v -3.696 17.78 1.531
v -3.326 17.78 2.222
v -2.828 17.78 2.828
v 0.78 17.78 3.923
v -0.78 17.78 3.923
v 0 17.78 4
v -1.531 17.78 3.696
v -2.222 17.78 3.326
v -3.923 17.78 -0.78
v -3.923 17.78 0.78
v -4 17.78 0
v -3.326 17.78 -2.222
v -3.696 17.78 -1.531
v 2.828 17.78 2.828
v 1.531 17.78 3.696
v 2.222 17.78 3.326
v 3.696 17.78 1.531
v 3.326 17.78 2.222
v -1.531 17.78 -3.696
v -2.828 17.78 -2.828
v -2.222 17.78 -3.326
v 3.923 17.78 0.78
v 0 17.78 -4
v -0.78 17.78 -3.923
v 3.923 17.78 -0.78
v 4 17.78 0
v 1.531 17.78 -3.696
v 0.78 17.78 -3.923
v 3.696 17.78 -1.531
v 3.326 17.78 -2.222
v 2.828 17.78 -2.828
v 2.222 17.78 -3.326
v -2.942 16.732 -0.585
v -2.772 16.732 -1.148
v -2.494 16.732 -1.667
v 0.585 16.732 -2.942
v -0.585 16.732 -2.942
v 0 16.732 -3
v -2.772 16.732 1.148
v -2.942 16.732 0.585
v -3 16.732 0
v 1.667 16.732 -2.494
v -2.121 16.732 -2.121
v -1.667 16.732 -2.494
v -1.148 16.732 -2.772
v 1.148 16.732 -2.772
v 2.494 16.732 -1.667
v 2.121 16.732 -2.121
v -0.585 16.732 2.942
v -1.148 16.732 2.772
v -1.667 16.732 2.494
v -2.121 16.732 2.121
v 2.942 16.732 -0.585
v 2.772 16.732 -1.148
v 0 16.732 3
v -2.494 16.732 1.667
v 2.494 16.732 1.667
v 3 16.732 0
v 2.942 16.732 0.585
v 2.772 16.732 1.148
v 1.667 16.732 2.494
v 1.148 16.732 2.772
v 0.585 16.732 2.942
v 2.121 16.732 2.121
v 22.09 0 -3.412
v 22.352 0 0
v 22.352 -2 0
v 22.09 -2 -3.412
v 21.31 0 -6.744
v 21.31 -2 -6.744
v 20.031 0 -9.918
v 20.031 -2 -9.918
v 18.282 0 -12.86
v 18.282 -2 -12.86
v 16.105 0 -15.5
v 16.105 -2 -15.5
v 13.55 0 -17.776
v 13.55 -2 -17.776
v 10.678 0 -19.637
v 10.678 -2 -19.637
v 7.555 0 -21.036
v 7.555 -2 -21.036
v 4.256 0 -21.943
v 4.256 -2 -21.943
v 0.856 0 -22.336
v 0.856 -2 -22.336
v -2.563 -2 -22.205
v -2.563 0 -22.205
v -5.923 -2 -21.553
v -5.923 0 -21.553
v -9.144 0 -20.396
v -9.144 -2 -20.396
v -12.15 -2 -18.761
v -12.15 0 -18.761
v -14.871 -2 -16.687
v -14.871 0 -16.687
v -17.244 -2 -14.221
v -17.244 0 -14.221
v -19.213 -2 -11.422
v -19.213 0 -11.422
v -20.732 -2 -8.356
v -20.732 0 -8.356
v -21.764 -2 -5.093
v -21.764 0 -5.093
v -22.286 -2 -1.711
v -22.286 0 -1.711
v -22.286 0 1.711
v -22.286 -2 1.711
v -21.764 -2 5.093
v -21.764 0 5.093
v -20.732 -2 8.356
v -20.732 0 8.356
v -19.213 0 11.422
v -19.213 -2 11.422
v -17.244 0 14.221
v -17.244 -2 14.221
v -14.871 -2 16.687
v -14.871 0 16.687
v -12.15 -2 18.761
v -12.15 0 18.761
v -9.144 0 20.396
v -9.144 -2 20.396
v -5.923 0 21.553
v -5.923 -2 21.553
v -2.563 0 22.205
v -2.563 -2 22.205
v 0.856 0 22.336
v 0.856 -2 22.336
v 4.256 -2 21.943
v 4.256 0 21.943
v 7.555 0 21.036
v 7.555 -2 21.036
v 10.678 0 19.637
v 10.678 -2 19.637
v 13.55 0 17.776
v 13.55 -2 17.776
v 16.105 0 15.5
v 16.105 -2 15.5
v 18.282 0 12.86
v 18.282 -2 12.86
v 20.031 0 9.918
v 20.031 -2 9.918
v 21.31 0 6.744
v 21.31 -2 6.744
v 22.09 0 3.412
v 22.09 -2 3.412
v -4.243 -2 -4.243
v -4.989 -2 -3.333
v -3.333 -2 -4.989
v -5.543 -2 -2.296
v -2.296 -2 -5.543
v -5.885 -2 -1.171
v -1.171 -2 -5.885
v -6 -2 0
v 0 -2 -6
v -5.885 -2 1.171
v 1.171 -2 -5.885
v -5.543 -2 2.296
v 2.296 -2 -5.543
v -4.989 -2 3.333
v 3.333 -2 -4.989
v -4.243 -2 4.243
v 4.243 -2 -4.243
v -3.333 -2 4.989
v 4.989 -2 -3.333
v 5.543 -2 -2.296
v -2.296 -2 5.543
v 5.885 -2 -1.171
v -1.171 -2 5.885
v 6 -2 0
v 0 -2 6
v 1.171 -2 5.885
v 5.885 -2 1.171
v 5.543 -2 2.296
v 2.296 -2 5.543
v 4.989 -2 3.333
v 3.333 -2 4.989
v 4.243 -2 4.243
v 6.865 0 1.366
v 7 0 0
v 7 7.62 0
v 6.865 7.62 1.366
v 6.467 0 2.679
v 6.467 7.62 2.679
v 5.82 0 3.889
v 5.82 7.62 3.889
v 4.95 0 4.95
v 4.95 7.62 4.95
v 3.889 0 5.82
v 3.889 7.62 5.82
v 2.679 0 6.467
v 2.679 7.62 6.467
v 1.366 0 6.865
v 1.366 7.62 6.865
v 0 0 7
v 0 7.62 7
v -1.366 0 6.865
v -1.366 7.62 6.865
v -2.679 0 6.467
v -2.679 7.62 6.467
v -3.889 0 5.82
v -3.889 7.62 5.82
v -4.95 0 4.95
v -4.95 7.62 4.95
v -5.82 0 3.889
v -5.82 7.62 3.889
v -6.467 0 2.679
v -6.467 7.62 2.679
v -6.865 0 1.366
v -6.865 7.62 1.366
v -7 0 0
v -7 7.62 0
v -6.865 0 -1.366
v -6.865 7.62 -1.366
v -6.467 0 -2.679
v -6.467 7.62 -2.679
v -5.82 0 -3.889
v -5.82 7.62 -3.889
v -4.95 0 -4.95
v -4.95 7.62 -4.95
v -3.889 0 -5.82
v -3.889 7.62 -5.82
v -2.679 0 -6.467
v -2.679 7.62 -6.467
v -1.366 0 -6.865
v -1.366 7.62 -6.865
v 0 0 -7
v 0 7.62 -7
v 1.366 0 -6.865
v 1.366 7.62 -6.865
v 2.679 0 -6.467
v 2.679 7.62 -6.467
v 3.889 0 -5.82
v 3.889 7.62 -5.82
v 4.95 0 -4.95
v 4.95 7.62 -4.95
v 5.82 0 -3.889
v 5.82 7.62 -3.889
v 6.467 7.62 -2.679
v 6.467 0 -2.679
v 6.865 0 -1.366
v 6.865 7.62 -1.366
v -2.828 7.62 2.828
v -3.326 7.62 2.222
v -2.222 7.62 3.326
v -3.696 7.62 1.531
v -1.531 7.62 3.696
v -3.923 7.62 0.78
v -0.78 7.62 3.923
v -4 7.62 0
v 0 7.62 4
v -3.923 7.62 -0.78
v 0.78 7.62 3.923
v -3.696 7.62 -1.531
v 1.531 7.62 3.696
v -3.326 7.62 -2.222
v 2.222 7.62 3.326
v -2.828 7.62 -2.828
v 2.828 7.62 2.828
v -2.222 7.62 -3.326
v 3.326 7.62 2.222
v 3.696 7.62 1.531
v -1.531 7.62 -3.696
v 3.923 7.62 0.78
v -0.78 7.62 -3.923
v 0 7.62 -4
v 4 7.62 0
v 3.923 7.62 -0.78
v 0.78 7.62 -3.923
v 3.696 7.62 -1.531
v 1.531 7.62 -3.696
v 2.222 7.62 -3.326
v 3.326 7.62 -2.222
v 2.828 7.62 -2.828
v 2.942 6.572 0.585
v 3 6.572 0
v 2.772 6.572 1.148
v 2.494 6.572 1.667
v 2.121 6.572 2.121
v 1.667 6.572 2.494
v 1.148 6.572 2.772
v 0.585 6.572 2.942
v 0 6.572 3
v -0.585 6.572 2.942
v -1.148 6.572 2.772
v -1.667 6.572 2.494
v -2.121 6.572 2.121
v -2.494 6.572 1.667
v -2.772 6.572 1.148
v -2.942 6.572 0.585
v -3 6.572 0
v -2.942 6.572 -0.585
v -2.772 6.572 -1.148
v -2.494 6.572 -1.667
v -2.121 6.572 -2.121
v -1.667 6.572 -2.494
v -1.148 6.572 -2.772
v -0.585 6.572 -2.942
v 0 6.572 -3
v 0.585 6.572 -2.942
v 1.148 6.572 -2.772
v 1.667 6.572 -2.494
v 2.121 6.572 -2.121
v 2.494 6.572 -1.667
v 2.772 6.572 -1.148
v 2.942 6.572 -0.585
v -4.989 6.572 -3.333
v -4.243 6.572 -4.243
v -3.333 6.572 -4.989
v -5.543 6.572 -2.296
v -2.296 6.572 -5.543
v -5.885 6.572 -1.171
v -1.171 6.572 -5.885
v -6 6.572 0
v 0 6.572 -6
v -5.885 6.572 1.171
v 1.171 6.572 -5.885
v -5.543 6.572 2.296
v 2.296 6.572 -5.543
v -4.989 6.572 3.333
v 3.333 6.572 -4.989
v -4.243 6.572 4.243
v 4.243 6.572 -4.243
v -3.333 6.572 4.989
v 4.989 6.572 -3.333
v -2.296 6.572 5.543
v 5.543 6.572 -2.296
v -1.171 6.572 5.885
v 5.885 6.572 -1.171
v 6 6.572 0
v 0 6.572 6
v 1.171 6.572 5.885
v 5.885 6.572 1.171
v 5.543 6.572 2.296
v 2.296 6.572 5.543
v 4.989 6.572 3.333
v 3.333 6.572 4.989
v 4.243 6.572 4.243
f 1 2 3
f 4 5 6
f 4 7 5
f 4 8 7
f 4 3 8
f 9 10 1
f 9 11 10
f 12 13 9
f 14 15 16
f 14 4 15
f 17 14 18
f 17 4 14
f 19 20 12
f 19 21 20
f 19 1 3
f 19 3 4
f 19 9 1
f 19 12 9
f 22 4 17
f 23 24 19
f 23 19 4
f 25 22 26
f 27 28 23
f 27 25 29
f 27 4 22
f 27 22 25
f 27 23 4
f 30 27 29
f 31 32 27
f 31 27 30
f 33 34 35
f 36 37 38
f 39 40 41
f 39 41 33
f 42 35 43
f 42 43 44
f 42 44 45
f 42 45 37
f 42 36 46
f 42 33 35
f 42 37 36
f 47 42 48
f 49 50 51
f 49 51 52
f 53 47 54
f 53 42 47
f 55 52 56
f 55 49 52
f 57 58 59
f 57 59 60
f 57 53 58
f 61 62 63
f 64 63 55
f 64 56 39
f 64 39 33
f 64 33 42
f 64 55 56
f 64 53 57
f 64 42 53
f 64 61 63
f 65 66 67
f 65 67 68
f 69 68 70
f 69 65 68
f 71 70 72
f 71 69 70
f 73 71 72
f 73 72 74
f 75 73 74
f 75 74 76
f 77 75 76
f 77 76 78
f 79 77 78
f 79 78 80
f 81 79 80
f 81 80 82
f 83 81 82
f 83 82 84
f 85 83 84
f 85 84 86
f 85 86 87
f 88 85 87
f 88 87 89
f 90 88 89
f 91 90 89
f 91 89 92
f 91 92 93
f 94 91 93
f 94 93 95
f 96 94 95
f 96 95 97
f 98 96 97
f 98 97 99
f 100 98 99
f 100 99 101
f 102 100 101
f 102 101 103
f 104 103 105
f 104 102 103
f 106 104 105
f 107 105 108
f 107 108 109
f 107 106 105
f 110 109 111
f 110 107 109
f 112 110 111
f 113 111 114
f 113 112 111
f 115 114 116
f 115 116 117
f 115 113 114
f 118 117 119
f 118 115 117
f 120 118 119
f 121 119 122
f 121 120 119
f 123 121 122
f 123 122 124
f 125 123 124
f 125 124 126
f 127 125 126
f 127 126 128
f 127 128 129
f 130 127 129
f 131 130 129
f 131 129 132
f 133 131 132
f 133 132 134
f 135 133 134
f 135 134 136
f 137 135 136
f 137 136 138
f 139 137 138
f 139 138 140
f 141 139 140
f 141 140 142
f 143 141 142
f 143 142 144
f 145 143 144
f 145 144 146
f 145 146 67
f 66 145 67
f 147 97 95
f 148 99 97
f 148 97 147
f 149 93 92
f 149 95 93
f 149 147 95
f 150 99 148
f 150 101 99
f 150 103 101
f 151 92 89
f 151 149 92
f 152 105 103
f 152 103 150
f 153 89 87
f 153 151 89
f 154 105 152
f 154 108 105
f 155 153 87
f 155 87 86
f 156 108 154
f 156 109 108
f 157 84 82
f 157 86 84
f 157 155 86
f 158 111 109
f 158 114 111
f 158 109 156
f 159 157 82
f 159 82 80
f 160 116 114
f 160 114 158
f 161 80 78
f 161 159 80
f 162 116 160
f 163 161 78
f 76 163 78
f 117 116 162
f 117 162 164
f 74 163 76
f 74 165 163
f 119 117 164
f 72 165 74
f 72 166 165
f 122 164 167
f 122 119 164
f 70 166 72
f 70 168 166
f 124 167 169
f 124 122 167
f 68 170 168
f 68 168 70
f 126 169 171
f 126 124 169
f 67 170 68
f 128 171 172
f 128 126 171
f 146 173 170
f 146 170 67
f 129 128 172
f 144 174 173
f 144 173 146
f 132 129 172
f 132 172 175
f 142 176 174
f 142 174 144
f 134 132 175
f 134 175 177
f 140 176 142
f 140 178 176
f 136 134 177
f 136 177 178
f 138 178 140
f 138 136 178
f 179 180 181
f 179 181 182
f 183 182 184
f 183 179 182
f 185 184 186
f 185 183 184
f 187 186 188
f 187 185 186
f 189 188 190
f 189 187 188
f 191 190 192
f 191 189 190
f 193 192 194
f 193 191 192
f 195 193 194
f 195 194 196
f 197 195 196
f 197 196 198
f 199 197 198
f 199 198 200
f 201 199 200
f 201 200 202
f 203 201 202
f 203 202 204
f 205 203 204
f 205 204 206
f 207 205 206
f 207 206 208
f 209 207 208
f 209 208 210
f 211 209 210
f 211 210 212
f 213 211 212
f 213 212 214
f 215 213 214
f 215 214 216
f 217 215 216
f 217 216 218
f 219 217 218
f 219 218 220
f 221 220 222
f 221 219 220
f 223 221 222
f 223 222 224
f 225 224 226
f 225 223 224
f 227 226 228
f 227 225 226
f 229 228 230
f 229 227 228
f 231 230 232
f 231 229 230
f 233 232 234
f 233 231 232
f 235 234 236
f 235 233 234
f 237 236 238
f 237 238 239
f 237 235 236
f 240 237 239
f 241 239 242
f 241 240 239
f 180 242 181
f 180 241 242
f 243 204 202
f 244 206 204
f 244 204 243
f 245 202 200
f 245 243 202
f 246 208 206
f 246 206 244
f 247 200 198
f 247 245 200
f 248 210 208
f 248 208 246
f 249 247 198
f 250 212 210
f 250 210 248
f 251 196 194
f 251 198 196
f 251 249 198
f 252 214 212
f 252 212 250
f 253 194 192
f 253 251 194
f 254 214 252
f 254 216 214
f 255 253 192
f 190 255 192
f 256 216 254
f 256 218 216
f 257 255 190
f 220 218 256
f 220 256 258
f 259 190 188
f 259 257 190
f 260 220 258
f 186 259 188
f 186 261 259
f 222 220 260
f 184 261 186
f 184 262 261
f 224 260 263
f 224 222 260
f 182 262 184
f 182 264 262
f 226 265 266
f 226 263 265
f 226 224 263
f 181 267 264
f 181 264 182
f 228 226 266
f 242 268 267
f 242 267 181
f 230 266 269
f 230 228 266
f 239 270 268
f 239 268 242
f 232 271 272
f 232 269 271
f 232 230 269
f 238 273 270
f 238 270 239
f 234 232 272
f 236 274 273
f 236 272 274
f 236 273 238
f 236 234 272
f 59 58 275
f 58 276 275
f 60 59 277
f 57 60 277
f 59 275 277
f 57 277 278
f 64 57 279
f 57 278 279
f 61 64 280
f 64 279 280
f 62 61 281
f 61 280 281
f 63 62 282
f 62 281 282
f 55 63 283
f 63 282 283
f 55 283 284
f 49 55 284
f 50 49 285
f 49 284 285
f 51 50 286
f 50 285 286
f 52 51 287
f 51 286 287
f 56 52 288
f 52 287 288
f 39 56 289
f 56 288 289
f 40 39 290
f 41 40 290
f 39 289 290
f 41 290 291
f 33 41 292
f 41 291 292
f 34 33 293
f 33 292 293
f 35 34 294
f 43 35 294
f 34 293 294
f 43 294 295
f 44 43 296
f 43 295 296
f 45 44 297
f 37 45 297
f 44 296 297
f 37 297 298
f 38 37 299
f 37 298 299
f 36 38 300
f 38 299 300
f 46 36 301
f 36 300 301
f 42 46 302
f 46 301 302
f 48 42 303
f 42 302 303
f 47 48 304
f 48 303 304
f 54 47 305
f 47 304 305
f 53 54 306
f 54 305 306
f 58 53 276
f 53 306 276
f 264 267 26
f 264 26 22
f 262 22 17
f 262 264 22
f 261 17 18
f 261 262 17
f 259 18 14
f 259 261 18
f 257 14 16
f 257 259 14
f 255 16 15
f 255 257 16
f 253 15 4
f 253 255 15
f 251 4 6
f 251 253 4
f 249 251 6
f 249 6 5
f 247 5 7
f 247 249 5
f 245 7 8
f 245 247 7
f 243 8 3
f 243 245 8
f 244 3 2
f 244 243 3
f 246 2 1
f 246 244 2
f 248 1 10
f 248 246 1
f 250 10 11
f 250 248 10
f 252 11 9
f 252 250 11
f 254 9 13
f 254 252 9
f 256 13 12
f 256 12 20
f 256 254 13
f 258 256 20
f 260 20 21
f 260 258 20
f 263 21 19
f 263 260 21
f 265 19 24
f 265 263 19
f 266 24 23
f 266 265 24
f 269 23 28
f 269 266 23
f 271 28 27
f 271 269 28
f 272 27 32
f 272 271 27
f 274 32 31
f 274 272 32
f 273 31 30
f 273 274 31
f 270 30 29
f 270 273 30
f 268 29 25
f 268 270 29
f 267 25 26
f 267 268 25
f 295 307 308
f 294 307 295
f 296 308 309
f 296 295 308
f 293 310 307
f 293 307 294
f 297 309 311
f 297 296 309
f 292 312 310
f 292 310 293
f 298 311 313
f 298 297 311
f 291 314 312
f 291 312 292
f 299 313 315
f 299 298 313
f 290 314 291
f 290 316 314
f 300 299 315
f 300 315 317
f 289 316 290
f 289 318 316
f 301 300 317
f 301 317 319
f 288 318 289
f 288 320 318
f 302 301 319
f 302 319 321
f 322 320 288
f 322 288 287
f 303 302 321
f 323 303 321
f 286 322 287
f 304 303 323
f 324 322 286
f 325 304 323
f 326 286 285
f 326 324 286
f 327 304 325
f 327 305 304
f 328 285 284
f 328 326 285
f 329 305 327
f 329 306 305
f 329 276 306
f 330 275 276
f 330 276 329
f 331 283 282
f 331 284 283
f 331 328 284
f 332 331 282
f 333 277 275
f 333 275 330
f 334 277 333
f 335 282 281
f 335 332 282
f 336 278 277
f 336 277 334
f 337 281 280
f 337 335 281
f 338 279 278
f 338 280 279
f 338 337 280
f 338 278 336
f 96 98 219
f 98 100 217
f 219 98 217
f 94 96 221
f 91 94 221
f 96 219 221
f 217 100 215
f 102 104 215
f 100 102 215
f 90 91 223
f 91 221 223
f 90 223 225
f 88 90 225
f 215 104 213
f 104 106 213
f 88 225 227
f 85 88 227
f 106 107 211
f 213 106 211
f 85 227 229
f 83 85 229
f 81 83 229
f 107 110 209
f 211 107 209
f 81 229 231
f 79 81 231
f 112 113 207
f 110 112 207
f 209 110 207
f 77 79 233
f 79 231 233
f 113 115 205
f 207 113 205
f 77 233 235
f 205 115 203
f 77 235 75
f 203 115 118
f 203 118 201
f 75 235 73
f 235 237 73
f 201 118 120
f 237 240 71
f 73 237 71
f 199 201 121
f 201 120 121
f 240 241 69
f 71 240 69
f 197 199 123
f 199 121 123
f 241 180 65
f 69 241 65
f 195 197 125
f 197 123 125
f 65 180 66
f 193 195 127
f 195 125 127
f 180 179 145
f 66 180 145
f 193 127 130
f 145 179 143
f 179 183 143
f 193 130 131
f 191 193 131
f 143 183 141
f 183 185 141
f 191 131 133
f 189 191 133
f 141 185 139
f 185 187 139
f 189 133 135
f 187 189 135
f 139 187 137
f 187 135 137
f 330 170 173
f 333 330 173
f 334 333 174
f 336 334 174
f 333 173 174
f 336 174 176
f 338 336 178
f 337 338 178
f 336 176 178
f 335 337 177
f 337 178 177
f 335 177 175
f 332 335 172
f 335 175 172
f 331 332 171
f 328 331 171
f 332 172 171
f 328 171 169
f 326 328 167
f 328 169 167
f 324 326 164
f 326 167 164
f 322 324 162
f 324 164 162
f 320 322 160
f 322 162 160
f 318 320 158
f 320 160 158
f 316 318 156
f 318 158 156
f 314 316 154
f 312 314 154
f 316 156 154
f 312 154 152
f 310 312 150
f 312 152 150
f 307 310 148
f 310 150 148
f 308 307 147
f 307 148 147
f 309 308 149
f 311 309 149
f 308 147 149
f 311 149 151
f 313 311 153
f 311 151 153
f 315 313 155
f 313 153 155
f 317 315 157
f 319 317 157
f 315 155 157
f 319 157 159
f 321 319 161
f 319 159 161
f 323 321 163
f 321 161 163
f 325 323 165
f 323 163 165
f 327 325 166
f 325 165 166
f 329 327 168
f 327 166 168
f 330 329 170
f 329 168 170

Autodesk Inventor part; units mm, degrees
ref_plane "YZ Plane" through (0, 0, 0) normal (1, 0, 0) x (0, 1, 0)
ref_plane "XZ Plane" through (0, 0, 0) normal (0, 1, 0) x (-1, 0, 0)
ref_plane "XY Plane" through (0, 0, 0) normal (0, 0, 1) x (1, 0, 0)
ref_plane "Work Plane3" through (0, 0, 0) normal (0, -1, 0) x (1, 0, 0)
sketch "Sketch2" plane through (0, 0, 0) normal (0, -1, 0) x (1, 0, 0)
  circle A0 centre (0, 0) radius 22.352
  arc A1 (22.352, 0) -> (-22.352, 0) centre (0, 0) ccw projected
  line L0 (22.352, 0) -> (-22.352, 0)
extrude "Extrusion2" add sketch "Sketch2" along normal blind 2
ref_plane "Work Plane5" through (0, 0, 0) normal (0, 1, 0) x (1, 0, 0)
sketch "Sketch3" plane through (0, 0, 0) normal (0, 1, 0) x (1, 0, 0)
  circle A0 centre (0, 0) radius 7
  line L0 (-20.955, 0) -> (20.955, 0) projected
  line L1 (-7, 0) -> (7, 0)
  dimension "d6" = 14
extrude "Extrusion3" add sketch "Sketch3" along normal blind 7.62
ref_plane "Work Plane4" through (0, -2, 0) normal (0, -1, 0) x (1, 0, 0)
sketch "Sketch4" plane through (0, -2, 0) normal (0, -1, 0) x (1, 0, 0)
  circle A0 centre (0, 0) radius 6
  dimension "d9" = 12
extrude "Extrusion4" cut sketch "Sketch4" against normal blind 8.5725
ref_plane "Work Plane6" through (0, 7.62, 0) normal (0, 1, 0) x (1, 0, 0)
sketch "Sketch5" plane through (0, 7.62, 0) normal (0, 1, 0) x (1, 0, 0)
  circle A0 centre (0, 0) radius 4
  line L0 (7, 0) -> (-7, 0) projected
  line L1 (4, 0) -> (-4, 0)
  dimension "d12" = 8
extrude "Extrusion5" add sketch "Sketch5" along normal blind 10.16
ref_plane "Work Plane7" through (0, 6.5725, 0) normal (0, -1, 0) x (1, 0, 0)
sketch "Sketch6" plane through (0, 6.5725, 0) normal (0, -1, 0) x (1, 0, 0)
  circle A0 centre (0, 0) radius 3
  dimension "d15" = 6
extrude "Extrusion6" cut sketch "Sketch6" against normal blind 10.16
ref_plane "Work Plane1" through (0, 25.4, 0) normal (0, 1, 0) x (1, 0, 0)
sketch "Sketch7" plane through (0, 25.4, 0) normal (0, 1, 0) x (1, 0, 0)
  point P0 (0, 0)
ref_plane "Work Plane2" through (0, 25.4, 0) normal (0, 1, 0) x (1, 0, 0)
sketch "Sketch12" plane through (0, 25.4, 0) normal (0, 1, 0) x (1, 0, 0)
  circle A0 centre (0, 0) radius 16.1182
  circle A1 centre (0, 0) radius 32.5204
extrude "Extrusion10" cut sketch "Sketch12" against normal up to surface (25.4 mm away)
properties part number "mold"
